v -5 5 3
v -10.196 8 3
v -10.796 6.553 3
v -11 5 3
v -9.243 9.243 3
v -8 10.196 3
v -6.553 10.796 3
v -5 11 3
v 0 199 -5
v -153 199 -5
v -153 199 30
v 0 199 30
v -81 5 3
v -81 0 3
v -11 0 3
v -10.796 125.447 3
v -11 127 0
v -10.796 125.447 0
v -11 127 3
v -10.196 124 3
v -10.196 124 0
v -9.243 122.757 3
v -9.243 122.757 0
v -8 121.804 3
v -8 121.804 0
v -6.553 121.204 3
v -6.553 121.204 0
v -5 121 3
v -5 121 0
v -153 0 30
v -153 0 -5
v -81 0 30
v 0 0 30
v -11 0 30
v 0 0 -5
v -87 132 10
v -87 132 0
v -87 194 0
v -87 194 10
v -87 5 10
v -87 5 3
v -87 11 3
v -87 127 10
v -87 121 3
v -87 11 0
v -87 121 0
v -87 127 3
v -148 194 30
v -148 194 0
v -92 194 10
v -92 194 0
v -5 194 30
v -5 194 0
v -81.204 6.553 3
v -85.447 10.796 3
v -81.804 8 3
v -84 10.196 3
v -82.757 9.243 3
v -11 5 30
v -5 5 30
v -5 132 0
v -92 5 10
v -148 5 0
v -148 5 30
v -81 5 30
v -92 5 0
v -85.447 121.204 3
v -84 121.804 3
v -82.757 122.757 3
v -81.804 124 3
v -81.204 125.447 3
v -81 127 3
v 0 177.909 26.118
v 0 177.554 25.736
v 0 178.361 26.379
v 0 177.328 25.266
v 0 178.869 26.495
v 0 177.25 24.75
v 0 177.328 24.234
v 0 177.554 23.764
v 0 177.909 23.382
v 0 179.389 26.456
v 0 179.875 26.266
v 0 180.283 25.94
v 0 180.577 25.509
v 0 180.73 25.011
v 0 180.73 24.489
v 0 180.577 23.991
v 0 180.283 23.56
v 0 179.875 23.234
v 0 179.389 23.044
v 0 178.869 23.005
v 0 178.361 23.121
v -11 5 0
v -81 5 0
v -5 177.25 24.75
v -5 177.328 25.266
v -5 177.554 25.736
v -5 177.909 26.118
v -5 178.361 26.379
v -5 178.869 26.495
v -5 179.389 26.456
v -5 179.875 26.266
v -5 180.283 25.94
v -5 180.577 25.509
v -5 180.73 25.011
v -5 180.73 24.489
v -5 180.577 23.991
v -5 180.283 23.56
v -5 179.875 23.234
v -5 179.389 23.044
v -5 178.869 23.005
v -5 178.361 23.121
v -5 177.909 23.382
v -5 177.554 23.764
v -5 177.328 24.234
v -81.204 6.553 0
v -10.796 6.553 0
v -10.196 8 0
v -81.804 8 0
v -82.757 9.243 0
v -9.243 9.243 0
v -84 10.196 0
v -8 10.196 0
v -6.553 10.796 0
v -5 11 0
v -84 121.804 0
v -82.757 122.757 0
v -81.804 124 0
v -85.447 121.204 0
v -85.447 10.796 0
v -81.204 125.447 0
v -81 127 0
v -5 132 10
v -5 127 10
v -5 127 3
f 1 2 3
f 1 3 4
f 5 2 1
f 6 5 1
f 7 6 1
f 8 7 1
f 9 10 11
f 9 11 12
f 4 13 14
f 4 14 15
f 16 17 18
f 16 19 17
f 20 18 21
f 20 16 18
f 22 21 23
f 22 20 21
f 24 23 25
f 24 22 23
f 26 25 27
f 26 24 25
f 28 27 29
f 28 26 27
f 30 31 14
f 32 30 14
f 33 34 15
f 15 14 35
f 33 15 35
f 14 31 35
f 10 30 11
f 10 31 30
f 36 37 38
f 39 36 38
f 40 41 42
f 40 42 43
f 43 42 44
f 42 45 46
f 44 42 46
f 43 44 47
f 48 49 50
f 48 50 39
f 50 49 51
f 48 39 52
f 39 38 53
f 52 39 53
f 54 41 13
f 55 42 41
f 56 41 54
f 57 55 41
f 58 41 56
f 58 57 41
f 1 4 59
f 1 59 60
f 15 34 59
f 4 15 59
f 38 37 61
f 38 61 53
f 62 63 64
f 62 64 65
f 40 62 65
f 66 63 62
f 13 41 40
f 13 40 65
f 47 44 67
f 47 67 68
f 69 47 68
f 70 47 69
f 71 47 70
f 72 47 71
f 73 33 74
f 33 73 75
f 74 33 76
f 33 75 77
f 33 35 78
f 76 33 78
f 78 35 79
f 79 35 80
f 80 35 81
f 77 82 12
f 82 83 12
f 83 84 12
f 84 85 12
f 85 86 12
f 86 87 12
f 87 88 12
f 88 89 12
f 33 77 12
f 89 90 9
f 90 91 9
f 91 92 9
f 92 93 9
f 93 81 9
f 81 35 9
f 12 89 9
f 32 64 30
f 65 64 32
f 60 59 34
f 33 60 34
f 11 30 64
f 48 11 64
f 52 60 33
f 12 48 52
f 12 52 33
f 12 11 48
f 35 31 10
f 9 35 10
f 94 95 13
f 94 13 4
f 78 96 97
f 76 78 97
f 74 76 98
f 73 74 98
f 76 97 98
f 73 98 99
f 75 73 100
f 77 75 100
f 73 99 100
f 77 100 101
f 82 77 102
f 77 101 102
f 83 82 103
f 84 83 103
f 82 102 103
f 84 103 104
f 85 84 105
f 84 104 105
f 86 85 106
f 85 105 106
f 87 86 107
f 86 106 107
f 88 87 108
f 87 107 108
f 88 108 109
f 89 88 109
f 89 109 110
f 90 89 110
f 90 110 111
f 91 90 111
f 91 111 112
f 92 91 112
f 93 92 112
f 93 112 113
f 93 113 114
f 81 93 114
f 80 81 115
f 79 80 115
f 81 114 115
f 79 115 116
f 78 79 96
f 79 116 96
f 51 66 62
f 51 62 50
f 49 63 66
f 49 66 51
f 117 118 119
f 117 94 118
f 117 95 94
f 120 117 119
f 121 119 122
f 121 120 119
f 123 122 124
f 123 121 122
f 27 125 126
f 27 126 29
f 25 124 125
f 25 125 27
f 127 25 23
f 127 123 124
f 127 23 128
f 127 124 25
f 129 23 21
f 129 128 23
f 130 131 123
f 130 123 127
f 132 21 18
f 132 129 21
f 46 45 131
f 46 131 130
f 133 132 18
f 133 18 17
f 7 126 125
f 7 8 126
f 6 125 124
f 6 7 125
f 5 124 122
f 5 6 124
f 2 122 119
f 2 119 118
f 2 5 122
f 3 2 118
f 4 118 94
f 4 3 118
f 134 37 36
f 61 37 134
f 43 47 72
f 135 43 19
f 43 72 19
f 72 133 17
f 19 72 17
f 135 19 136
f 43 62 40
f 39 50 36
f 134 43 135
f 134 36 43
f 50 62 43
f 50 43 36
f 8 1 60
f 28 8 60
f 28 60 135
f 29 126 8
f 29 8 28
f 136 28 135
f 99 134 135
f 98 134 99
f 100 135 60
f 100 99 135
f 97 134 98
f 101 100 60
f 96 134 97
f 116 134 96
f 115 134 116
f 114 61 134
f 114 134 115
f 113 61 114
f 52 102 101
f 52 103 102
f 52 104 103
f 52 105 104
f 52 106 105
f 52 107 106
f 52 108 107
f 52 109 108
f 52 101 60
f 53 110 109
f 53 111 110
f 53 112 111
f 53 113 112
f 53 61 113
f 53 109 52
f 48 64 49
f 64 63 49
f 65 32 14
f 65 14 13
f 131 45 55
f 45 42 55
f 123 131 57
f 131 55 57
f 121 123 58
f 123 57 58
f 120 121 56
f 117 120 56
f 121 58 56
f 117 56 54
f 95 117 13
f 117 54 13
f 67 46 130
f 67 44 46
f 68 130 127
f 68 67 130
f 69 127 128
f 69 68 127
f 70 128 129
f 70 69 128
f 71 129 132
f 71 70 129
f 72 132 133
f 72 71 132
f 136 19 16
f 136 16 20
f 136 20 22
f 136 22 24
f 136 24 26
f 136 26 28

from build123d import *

# Parameters (mm, degrees)
SKETCH1_W           = 199
SKETCH1_H           = 153
BOSS_EXTRUDE1_DEPTH = 5
SKETCH2_W           = 153
SKETCH2_H           = 199
SKETCH2_W_2         = 82
SKETCH2_H_2         = 122
SKETCH2_H_3         = 62
SKETCH2_W_3         = 56
SKETCH2_H_4         = 189
BOSS_EXTRUDE2_DEPTH = 10
SKETCH3_W           = 153
SKETCH3_H           = 199
SKETCH3_W_2         = 143
SKETCH3_H_2         = 189
BOSS_EXTRUDE3_DEPTH = 20
SKETCH4_W           = 6
SKETCH4_H           = 6
BOSS_EXTRUDE4_DEPTH = 3
FILLET1_R           = 6
SKETCH5_W           = 70
SKETCH5_H           = 5
CUT_EXTRUDE1_DEPTH  = 27
SKETCH6_R           = 1.75
CUT_EXTRUDE2_DEPTH  = 5


with BuildPart() as part:
    # Sketch1 → Boss-Extrude1 (new body)
    with BuildSketch(Plane(origin=(0, 0, 0), x_dir=(0, 1, 0), z_dir=(0, 0, 1))):
        with Locations((99.5, 76.5)):
            Rectangle(SKETCH1_W, SKETCH1_H)
    extrude(amount=-BOSS_EXTRUDE1_DEPTH)

    # Sketch2 → Boss-Extrude2 (add)
    with BuildSketch(Plane.XY):
        with Locations((-76.5, 99.5)):
            Rectangle(SKETCH2_W, SKETCH2_H)
        with Locations((-46, 66)):
            Rectangle(SKETCH2_W_2, SKETCH2_H_2, mode=Mode.SUBTRACT)
        with Locations((-46, 163)):
            Rectangle(SKETCH2_W_2, SKETCH2_H_3, mode=Mode.SUBTRACT)
        with Locations((-120, 99.5)):
            Rectangle(SKETCH2_W_3, SKETCH2_H_4, mode=Mode.SUBTRACT)
    extrude(amount=BOSS_EXTRUDE2_DEPTH)

    # Sketch3 → Boss-Extrude3 (add)
    with BuildSketch(Plane.XY.offset(10)):
        with Locations((-76.5, 99.5)):
            Rectangle(SKETCH3_W, SKETCH3_H)
        with Locations((-76.5, 99.5)):
            Rectangle(SKETCH3_W_2, SKETCH3_H_2, mode=Mode.SUBTRACT)
    extrude(amount=BOSS_EXTRUDE3_DEPTH)

    # Sketch4 → Boss-Extrude4 (add)
    with BuildSketch(Plane.XY):
        with Locations((-84, 124)):
            Rectangle(SKETCH4_W, SKETCH4_H)
        with Locations((-8, 124)):
            Rectangle(SKETCH4_W, SKETCH4_H)
        with Locations((-8, 8)):
            Rectangle(SKETCH4_W, SKETCH4_H)
        with Locations((-84, 8)):
            Rectangle(SKETCH4_W, SKETCH4_H)
    extrude(amount=BOSS_EXTRUDE4_DEPTH)

    # Fillet1
    fillet1_edges = [part.edges().sort_by_distance(p)[0] for p in [
        (-81, 11, 1.5),
        (-11, 11, 1.5),
        (-81, 121, 1.5),
        (-11, 121, 1.5),
    ]]
    fillet(fillet1_edges, radius=FILLET1_R - 0.0001)  # a hair under: the kernel refuses the full size

    # Sketch5 → Cut-Extrude1 (cut)
    with BuildSketch(Plane.XY.offset(30)):
        with Locations((-46, 2.5)):
            Rectangle(SKETCH5_W, SKETCH5_H)
    extrude(amount=-CUT_EXTRUDE1_DEPTH, mode=Mode.SUBTRACT)

    # Sketch6 → Cut-Extrude2 (cut)
    with BuildSketch(Plane(origin=(-5, 0, 0), x_dir=(0, -1, 0), z_dir=(-1, 0, 0))):
        with Locations((-179, 24.75)):
            Circle(SKETCH6_R)
    extrude(amount=-CUT_EXTRUDE2_DEPTH, mode=Mode.SUBTRACT)


solid = part.part
